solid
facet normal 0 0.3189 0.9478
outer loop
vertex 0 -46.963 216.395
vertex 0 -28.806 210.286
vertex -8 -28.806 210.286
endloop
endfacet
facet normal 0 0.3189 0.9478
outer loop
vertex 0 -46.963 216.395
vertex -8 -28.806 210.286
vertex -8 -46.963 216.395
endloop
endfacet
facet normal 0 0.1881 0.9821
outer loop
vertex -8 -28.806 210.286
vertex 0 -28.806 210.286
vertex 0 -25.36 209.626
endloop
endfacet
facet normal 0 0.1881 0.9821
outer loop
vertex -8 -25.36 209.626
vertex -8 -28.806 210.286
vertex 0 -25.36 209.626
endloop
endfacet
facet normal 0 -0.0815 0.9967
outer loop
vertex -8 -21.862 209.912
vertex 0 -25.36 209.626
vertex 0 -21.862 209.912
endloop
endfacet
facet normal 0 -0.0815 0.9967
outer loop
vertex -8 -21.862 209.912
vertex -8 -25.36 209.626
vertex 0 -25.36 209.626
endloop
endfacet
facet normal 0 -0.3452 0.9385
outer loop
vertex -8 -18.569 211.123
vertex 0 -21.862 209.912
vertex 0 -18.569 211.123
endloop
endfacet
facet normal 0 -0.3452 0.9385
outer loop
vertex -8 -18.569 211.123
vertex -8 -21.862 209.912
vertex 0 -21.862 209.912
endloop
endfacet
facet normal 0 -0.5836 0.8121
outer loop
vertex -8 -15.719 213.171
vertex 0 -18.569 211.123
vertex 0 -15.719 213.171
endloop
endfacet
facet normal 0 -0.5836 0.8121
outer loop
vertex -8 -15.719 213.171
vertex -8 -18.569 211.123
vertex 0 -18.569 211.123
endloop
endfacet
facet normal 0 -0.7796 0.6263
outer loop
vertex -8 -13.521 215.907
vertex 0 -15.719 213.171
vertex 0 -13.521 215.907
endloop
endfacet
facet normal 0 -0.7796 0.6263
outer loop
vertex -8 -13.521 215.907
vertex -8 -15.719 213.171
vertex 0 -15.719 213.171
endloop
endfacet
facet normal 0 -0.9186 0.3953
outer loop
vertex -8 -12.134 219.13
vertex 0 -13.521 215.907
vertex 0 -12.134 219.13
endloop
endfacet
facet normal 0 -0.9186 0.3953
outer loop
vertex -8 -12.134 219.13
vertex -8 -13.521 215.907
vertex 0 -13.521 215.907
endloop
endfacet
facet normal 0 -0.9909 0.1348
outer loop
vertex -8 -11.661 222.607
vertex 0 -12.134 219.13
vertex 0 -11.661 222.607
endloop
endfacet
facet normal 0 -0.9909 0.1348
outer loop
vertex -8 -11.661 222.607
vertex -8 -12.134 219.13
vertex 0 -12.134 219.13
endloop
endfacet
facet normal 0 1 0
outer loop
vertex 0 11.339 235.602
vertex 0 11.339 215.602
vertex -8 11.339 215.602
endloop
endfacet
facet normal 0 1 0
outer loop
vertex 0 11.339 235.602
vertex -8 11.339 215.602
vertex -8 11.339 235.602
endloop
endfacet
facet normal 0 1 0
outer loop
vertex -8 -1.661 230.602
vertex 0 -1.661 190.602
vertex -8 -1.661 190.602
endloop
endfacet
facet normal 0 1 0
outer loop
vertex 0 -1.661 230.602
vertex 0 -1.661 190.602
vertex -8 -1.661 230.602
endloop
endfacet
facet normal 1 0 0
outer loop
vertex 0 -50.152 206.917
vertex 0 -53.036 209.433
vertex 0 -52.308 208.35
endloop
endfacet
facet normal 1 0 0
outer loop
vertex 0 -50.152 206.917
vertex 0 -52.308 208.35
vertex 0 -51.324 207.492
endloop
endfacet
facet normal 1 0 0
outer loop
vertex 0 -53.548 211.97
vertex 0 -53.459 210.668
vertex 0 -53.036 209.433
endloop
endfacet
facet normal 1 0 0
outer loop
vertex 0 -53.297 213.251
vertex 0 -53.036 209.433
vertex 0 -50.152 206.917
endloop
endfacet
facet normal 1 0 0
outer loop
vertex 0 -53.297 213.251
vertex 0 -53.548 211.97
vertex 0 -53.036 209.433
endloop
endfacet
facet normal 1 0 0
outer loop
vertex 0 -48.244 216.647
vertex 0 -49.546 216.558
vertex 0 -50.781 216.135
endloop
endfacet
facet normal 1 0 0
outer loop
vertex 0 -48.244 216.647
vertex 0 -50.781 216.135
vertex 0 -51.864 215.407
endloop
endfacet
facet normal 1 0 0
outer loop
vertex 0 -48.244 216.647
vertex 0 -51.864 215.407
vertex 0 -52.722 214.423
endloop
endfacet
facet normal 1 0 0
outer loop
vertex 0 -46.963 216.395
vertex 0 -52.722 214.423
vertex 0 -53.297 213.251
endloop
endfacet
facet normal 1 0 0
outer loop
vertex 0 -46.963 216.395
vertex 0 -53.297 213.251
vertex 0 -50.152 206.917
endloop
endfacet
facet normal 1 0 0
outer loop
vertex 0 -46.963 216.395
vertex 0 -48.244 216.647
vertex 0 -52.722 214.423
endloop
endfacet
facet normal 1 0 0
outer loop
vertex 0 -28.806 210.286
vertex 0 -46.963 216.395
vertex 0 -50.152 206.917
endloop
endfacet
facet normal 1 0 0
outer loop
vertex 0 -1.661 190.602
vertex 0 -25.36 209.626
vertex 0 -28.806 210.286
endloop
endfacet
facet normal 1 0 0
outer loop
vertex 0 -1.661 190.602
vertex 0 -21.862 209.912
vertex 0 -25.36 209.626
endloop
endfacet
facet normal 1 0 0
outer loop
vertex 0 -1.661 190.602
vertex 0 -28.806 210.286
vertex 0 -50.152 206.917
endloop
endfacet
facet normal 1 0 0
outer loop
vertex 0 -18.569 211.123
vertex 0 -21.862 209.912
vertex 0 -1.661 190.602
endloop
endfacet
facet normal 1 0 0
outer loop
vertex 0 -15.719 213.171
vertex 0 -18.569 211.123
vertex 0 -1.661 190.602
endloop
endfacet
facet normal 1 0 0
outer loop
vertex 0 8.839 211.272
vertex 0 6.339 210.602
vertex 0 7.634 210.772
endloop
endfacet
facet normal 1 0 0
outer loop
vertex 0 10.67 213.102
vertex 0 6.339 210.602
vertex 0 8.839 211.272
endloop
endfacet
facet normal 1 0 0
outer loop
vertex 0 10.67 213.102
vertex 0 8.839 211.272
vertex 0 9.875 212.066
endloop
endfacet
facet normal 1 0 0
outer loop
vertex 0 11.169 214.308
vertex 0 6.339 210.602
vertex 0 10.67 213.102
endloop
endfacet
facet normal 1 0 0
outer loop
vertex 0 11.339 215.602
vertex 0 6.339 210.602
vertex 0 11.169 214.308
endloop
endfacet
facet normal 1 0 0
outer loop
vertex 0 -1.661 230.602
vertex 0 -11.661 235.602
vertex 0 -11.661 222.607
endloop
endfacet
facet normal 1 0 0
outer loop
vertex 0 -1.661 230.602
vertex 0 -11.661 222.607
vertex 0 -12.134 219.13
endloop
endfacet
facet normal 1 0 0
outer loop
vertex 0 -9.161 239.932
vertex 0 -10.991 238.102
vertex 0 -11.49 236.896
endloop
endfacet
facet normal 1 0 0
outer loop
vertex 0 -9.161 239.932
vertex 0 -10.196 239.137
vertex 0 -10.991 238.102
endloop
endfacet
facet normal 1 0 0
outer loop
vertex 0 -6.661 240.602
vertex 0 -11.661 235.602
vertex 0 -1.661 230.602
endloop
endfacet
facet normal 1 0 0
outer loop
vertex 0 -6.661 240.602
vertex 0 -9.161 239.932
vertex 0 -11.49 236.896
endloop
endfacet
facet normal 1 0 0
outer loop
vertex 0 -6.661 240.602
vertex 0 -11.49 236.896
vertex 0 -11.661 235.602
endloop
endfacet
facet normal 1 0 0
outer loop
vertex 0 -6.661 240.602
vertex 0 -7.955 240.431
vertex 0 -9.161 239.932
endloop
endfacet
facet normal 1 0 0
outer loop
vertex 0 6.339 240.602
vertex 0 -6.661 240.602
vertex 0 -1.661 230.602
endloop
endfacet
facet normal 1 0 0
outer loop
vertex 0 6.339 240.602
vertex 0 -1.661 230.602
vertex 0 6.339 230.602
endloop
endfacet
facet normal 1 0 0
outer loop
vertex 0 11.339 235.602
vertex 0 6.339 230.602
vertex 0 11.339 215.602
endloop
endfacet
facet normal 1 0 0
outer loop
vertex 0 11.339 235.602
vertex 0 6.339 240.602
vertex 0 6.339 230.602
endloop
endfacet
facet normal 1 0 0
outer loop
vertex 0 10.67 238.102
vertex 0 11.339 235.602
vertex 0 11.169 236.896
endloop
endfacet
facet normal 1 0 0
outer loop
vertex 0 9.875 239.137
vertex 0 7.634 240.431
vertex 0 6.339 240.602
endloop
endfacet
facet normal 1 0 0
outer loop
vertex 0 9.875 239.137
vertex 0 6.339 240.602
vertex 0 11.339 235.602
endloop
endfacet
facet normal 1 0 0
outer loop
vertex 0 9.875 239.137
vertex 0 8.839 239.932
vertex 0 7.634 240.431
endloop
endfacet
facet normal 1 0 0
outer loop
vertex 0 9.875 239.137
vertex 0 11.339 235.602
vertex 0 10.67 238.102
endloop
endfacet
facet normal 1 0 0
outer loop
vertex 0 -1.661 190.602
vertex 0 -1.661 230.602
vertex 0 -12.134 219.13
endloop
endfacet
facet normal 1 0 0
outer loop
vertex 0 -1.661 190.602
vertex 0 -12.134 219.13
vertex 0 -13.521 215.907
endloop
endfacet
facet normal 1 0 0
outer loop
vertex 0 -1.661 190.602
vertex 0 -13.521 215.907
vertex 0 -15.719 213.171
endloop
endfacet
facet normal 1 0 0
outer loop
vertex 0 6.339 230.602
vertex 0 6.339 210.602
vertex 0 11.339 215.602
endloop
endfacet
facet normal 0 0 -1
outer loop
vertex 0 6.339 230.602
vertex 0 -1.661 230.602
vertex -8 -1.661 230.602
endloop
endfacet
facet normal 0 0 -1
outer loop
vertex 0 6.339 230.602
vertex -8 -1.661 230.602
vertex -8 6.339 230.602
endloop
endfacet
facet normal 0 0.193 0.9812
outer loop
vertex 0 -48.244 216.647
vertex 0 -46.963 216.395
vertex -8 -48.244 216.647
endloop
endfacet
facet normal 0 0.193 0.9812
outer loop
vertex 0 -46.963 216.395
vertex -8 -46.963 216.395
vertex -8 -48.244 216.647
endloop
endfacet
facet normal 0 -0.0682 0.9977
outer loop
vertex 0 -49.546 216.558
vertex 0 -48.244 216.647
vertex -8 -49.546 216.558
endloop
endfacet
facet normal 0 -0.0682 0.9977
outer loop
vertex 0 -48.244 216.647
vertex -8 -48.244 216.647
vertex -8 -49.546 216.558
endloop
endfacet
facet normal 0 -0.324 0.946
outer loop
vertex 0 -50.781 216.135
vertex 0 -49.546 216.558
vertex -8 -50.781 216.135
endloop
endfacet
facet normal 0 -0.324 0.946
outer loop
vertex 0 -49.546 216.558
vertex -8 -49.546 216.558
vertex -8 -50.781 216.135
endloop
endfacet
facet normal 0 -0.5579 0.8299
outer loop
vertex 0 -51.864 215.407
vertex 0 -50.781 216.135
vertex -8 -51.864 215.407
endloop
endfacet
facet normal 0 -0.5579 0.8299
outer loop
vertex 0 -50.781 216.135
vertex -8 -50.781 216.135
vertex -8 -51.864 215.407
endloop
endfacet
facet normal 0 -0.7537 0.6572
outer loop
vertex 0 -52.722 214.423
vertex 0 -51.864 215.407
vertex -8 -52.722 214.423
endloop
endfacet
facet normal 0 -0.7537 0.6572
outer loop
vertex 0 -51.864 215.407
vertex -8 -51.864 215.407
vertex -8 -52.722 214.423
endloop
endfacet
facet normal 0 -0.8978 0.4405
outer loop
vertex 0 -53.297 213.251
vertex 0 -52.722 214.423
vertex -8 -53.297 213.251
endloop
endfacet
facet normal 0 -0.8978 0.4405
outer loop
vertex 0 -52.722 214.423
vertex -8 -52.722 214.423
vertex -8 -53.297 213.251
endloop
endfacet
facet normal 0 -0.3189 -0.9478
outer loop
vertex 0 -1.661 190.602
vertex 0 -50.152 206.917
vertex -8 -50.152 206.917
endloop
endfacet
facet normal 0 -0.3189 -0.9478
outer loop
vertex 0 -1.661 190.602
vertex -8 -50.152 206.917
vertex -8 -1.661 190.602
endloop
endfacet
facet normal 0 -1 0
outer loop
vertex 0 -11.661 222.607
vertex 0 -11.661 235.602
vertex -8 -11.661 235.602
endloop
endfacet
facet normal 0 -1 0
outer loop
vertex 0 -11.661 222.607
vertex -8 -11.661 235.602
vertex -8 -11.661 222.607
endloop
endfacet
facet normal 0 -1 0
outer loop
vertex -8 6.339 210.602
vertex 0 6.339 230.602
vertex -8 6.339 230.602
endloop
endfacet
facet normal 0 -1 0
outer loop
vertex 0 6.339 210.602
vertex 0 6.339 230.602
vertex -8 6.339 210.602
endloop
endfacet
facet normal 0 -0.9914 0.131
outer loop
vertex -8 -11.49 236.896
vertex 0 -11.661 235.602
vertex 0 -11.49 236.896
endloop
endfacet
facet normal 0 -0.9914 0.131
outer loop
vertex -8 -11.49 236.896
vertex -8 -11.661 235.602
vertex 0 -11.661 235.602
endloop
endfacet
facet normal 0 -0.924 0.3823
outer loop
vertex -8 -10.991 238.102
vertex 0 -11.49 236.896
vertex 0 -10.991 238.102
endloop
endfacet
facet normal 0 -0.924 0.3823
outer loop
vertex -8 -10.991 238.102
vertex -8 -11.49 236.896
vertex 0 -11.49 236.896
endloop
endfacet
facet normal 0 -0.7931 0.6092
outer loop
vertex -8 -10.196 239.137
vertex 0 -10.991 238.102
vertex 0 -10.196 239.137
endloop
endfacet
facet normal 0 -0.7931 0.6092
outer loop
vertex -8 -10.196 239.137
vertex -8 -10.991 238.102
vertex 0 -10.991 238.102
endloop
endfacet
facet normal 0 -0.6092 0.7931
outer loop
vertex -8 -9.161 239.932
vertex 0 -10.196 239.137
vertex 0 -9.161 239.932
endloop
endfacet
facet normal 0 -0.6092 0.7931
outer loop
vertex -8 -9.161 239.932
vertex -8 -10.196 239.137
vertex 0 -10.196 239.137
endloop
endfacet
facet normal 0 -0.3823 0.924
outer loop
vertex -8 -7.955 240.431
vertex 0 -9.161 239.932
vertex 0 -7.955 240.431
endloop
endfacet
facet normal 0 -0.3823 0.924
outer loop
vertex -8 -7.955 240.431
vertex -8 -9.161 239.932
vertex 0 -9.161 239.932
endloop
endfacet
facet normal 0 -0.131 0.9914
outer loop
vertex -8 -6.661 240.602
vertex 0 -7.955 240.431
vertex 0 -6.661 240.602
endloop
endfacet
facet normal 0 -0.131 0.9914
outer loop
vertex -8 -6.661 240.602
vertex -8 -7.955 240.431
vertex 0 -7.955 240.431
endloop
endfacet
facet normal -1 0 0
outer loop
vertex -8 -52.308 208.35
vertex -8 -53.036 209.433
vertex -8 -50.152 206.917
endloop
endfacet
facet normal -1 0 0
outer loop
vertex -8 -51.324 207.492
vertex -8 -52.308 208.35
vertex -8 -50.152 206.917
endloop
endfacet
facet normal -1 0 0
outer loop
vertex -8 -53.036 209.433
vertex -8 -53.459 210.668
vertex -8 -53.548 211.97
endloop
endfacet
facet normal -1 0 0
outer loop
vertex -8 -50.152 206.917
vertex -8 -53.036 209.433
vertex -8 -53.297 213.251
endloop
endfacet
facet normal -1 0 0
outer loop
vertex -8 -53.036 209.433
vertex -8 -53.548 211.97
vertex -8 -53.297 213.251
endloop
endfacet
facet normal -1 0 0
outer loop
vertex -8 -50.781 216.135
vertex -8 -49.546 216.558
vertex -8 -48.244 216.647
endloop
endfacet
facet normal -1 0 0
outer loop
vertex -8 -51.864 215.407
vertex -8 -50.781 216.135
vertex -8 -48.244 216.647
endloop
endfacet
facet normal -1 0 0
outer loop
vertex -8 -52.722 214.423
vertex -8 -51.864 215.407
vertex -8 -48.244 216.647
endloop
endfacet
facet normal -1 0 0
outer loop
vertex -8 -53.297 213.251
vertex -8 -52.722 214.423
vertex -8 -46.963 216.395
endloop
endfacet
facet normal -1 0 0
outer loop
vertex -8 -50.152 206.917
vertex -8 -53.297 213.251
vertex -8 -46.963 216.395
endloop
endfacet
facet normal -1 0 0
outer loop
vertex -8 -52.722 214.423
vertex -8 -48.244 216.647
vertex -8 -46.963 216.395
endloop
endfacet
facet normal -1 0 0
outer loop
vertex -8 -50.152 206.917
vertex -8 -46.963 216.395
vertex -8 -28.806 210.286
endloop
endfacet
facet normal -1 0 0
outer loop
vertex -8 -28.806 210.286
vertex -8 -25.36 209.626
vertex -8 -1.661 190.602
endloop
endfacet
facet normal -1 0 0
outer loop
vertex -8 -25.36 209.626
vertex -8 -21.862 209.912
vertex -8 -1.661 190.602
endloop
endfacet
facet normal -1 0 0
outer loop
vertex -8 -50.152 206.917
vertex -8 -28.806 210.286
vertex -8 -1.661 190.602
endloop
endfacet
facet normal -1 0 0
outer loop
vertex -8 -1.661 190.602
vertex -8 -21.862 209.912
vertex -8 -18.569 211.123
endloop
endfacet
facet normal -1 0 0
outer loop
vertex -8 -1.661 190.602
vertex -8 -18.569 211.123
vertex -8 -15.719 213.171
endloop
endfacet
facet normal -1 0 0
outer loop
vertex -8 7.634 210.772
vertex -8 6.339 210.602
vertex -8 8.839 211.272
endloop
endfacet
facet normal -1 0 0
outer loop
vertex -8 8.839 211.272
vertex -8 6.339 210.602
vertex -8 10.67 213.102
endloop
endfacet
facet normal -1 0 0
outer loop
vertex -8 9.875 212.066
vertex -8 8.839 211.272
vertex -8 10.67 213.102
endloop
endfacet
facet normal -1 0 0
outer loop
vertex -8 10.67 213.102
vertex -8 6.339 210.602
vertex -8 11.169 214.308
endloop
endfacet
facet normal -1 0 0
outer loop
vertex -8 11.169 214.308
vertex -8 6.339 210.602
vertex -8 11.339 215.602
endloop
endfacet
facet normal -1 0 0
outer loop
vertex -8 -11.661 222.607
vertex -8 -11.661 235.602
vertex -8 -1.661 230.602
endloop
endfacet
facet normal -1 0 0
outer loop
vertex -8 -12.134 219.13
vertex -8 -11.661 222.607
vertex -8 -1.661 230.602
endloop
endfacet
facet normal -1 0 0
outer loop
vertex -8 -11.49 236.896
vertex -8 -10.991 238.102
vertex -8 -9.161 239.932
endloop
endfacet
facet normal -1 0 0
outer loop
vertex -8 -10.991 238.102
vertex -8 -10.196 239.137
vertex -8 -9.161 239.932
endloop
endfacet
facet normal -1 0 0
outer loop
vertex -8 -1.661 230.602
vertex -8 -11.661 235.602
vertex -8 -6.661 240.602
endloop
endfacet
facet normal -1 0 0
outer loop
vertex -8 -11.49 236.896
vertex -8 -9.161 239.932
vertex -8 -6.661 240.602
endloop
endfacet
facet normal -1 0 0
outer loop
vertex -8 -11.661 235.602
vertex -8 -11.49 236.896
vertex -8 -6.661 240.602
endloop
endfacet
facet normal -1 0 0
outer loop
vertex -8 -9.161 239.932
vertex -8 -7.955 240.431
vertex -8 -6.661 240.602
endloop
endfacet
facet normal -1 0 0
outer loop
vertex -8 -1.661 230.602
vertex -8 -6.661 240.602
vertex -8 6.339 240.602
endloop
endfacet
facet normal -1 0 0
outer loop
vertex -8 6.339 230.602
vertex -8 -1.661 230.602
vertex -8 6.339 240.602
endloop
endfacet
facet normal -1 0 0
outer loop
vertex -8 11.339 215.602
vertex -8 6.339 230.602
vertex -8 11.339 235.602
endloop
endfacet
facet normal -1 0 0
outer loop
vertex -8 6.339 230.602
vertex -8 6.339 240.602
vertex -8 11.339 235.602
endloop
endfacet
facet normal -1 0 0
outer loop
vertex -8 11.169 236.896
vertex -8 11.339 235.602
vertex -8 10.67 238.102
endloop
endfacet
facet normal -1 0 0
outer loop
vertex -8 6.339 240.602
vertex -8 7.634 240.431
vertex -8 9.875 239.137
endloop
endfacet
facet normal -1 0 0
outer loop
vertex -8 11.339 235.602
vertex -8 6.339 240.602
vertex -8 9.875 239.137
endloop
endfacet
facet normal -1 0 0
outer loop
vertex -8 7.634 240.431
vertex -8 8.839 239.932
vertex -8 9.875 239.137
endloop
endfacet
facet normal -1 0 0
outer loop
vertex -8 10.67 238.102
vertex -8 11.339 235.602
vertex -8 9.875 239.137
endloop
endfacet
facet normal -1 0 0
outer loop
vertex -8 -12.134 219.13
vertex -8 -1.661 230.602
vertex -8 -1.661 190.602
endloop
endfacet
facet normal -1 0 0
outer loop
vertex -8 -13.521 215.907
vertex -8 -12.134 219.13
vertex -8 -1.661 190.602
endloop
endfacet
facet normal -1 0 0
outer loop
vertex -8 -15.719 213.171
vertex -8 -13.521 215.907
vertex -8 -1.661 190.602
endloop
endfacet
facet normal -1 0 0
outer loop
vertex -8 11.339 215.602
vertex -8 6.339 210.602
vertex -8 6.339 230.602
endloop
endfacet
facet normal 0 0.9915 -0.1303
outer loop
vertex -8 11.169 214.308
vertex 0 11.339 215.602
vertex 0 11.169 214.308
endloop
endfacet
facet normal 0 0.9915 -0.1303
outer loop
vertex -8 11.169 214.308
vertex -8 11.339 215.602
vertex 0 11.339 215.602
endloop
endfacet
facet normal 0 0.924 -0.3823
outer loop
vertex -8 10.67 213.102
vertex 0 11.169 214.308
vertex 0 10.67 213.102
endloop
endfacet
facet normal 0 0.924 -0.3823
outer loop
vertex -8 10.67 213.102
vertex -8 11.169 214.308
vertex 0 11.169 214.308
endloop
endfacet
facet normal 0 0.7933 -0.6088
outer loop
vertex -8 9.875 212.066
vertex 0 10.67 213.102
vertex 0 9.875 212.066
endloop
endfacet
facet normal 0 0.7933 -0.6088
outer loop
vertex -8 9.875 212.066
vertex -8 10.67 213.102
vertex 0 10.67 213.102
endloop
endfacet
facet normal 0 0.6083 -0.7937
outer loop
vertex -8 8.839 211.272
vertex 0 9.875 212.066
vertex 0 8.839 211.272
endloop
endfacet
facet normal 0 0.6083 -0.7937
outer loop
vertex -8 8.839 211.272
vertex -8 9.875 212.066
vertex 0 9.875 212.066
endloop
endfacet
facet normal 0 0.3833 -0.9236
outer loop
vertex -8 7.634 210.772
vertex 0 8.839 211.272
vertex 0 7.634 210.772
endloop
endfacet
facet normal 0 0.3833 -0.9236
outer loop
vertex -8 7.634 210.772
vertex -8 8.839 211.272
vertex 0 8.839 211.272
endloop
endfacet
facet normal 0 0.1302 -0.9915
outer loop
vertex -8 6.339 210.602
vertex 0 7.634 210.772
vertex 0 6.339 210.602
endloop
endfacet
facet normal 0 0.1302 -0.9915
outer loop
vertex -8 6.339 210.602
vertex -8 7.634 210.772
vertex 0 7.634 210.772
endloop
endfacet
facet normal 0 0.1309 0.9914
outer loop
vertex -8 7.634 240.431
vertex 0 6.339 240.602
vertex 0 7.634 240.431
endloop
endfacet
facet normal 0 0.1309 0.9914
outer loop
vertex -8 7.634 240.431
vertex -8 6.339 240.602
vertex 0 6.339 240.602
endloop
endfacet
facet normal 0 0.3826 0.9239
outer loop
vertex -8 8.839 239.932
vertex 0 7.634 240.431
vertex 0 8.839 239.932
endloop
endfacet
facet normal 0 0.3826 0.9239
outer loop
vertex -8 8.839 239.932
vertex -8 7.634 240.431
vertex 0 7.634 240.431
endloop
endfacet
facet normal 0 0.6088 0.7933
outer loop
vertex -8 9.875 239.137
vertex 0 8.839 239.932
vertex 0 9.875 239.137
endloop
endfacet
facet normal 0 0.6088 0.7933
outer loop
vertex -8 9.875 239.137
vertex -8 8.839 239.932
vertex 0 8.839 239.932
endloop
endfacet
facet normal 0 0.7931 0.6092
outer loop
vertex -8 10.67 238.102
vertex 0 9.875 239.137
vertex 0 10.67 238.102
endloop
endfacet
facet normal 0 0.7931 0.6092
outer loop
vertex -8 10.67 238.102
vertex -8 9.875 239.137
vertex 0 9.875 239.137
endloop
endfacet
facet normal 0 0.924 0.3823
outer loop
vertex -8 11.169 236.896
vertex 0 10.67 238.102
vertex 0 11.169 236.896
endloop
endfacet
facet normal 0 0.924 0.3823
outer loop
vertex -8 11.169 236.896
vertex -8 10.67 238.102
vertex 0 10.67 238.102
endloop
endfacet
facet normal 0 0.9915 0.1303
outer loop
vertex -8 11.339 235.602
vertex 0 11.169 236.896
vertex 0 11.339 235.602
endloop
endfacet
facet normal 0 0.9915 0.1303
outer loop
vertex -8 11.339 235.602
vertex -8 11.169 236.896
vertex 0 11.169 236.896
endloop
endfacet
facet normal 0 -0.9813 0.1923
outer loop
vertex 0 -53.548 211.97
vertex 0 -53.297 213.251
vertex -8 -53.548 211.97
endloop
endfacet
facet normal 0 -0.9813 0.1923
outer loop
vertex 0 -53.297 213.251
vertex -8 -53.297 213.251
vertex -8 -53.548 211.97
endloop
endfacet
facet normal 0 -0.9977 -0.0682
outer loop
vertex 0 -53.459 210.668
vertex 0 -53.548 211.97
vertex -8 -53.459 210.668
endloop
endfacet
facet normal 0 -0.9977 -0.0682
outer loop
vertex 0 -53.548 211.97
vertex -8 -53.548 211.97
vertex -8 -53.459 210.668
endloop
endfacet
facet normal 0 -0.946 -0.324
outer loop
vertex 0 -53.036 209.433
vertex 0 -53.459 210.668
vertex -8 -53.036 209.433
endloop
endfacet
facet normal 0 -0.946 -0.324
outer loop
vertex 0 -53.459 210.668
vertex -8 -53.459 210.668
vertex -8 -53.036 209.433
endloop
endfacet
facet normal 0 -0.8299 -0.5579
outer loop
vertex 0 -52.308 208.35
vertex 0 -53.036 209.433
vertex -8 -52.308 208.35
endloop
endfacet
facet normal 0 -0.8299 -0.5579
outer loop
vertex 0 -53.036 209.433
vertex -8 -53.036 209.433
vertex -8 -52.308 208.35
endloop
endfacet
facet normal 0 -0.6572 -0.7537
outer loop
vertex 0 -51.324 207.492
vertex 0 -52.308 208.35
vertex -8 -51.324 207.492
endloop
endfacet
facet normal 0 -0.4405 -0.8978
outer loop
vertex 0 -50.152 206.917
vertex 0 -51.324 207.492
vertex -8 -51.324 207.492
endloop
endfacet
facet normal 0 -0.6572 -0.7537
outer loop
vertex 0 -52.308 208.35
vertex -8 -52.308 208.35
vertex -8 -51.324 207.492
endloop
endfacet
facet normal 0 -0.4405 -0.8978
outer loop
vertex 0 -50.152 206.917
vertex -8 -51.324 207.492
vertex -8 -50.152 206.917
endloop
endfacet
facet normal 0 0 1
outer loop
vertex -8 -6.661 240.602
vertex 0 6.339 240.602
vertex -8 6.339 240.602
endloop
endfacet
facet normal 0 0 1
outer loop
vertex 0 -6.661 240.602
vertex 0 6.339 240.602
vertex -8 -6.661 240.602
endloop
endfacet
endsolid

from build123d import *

# Parameters (mm, degrees)
F1_DEPTH = 8
F2_R     = 4.99999
F3_R     = 13
F4_R     = 4.99999


# Not quite as in the source:
# - a fillet or chamfer is up to 0.001 mm smaller than in the source, because OpenCascade refuses the exact size


with BuildPart() as f1:
    # F0 (on Right) → F1 (new body)
    with BuildSketch(Plane.YZ):
        Polygon((11.3393977799, 240.6016960415), (-11.6606022201, 240.6016960415), (-11.6606022201, 204.5172253872), (-51.7021150763, 217.9898196767), (-54.8910993051, 208.5119306929), (-1.6606022201, 190.6016960415), (-1.6606022201, 230.6016960415), (6.3393977799, 230.6016960415), (6.3393977799, 210.6016960415), (11.3393977799, 210.6016960415), align=None)
    extrude(amount=-F1_DEPTH)

    # F2 (radius 5 in the source; OpenCascade refuses exactly that, so slightly less here)
    f2_edges = [f1.edges().sort_by_distance(p)[0] for p in [
        (-4, -51.702115, 217.98982),
        (-4, -54.891099, 208.511931),
    ]]
    fillet(f2_edges, radius=F2_R)

    # F3
    f3_edges = [f1.edges().sort_by_distance(p)[0] for p in [
        (-4, -11.660602, 204.517225),
    ]]
    fillet(f3_edges, radius=F3_R)

    # F4 (radius 5 in the source; OpenCascade refuses exactly that, so slightly less here)
    f4_edges = [f1.edges().sort_by_distance(p)[0] for p in [
        (-4, -11.660602, 240.601696),
        (-4, 11.339398, 240.601696),
        (-4, 11.339398, 210.601696),
    ]]
    fillet(f4_edges, radius=F4_R)


solid = f1.part
